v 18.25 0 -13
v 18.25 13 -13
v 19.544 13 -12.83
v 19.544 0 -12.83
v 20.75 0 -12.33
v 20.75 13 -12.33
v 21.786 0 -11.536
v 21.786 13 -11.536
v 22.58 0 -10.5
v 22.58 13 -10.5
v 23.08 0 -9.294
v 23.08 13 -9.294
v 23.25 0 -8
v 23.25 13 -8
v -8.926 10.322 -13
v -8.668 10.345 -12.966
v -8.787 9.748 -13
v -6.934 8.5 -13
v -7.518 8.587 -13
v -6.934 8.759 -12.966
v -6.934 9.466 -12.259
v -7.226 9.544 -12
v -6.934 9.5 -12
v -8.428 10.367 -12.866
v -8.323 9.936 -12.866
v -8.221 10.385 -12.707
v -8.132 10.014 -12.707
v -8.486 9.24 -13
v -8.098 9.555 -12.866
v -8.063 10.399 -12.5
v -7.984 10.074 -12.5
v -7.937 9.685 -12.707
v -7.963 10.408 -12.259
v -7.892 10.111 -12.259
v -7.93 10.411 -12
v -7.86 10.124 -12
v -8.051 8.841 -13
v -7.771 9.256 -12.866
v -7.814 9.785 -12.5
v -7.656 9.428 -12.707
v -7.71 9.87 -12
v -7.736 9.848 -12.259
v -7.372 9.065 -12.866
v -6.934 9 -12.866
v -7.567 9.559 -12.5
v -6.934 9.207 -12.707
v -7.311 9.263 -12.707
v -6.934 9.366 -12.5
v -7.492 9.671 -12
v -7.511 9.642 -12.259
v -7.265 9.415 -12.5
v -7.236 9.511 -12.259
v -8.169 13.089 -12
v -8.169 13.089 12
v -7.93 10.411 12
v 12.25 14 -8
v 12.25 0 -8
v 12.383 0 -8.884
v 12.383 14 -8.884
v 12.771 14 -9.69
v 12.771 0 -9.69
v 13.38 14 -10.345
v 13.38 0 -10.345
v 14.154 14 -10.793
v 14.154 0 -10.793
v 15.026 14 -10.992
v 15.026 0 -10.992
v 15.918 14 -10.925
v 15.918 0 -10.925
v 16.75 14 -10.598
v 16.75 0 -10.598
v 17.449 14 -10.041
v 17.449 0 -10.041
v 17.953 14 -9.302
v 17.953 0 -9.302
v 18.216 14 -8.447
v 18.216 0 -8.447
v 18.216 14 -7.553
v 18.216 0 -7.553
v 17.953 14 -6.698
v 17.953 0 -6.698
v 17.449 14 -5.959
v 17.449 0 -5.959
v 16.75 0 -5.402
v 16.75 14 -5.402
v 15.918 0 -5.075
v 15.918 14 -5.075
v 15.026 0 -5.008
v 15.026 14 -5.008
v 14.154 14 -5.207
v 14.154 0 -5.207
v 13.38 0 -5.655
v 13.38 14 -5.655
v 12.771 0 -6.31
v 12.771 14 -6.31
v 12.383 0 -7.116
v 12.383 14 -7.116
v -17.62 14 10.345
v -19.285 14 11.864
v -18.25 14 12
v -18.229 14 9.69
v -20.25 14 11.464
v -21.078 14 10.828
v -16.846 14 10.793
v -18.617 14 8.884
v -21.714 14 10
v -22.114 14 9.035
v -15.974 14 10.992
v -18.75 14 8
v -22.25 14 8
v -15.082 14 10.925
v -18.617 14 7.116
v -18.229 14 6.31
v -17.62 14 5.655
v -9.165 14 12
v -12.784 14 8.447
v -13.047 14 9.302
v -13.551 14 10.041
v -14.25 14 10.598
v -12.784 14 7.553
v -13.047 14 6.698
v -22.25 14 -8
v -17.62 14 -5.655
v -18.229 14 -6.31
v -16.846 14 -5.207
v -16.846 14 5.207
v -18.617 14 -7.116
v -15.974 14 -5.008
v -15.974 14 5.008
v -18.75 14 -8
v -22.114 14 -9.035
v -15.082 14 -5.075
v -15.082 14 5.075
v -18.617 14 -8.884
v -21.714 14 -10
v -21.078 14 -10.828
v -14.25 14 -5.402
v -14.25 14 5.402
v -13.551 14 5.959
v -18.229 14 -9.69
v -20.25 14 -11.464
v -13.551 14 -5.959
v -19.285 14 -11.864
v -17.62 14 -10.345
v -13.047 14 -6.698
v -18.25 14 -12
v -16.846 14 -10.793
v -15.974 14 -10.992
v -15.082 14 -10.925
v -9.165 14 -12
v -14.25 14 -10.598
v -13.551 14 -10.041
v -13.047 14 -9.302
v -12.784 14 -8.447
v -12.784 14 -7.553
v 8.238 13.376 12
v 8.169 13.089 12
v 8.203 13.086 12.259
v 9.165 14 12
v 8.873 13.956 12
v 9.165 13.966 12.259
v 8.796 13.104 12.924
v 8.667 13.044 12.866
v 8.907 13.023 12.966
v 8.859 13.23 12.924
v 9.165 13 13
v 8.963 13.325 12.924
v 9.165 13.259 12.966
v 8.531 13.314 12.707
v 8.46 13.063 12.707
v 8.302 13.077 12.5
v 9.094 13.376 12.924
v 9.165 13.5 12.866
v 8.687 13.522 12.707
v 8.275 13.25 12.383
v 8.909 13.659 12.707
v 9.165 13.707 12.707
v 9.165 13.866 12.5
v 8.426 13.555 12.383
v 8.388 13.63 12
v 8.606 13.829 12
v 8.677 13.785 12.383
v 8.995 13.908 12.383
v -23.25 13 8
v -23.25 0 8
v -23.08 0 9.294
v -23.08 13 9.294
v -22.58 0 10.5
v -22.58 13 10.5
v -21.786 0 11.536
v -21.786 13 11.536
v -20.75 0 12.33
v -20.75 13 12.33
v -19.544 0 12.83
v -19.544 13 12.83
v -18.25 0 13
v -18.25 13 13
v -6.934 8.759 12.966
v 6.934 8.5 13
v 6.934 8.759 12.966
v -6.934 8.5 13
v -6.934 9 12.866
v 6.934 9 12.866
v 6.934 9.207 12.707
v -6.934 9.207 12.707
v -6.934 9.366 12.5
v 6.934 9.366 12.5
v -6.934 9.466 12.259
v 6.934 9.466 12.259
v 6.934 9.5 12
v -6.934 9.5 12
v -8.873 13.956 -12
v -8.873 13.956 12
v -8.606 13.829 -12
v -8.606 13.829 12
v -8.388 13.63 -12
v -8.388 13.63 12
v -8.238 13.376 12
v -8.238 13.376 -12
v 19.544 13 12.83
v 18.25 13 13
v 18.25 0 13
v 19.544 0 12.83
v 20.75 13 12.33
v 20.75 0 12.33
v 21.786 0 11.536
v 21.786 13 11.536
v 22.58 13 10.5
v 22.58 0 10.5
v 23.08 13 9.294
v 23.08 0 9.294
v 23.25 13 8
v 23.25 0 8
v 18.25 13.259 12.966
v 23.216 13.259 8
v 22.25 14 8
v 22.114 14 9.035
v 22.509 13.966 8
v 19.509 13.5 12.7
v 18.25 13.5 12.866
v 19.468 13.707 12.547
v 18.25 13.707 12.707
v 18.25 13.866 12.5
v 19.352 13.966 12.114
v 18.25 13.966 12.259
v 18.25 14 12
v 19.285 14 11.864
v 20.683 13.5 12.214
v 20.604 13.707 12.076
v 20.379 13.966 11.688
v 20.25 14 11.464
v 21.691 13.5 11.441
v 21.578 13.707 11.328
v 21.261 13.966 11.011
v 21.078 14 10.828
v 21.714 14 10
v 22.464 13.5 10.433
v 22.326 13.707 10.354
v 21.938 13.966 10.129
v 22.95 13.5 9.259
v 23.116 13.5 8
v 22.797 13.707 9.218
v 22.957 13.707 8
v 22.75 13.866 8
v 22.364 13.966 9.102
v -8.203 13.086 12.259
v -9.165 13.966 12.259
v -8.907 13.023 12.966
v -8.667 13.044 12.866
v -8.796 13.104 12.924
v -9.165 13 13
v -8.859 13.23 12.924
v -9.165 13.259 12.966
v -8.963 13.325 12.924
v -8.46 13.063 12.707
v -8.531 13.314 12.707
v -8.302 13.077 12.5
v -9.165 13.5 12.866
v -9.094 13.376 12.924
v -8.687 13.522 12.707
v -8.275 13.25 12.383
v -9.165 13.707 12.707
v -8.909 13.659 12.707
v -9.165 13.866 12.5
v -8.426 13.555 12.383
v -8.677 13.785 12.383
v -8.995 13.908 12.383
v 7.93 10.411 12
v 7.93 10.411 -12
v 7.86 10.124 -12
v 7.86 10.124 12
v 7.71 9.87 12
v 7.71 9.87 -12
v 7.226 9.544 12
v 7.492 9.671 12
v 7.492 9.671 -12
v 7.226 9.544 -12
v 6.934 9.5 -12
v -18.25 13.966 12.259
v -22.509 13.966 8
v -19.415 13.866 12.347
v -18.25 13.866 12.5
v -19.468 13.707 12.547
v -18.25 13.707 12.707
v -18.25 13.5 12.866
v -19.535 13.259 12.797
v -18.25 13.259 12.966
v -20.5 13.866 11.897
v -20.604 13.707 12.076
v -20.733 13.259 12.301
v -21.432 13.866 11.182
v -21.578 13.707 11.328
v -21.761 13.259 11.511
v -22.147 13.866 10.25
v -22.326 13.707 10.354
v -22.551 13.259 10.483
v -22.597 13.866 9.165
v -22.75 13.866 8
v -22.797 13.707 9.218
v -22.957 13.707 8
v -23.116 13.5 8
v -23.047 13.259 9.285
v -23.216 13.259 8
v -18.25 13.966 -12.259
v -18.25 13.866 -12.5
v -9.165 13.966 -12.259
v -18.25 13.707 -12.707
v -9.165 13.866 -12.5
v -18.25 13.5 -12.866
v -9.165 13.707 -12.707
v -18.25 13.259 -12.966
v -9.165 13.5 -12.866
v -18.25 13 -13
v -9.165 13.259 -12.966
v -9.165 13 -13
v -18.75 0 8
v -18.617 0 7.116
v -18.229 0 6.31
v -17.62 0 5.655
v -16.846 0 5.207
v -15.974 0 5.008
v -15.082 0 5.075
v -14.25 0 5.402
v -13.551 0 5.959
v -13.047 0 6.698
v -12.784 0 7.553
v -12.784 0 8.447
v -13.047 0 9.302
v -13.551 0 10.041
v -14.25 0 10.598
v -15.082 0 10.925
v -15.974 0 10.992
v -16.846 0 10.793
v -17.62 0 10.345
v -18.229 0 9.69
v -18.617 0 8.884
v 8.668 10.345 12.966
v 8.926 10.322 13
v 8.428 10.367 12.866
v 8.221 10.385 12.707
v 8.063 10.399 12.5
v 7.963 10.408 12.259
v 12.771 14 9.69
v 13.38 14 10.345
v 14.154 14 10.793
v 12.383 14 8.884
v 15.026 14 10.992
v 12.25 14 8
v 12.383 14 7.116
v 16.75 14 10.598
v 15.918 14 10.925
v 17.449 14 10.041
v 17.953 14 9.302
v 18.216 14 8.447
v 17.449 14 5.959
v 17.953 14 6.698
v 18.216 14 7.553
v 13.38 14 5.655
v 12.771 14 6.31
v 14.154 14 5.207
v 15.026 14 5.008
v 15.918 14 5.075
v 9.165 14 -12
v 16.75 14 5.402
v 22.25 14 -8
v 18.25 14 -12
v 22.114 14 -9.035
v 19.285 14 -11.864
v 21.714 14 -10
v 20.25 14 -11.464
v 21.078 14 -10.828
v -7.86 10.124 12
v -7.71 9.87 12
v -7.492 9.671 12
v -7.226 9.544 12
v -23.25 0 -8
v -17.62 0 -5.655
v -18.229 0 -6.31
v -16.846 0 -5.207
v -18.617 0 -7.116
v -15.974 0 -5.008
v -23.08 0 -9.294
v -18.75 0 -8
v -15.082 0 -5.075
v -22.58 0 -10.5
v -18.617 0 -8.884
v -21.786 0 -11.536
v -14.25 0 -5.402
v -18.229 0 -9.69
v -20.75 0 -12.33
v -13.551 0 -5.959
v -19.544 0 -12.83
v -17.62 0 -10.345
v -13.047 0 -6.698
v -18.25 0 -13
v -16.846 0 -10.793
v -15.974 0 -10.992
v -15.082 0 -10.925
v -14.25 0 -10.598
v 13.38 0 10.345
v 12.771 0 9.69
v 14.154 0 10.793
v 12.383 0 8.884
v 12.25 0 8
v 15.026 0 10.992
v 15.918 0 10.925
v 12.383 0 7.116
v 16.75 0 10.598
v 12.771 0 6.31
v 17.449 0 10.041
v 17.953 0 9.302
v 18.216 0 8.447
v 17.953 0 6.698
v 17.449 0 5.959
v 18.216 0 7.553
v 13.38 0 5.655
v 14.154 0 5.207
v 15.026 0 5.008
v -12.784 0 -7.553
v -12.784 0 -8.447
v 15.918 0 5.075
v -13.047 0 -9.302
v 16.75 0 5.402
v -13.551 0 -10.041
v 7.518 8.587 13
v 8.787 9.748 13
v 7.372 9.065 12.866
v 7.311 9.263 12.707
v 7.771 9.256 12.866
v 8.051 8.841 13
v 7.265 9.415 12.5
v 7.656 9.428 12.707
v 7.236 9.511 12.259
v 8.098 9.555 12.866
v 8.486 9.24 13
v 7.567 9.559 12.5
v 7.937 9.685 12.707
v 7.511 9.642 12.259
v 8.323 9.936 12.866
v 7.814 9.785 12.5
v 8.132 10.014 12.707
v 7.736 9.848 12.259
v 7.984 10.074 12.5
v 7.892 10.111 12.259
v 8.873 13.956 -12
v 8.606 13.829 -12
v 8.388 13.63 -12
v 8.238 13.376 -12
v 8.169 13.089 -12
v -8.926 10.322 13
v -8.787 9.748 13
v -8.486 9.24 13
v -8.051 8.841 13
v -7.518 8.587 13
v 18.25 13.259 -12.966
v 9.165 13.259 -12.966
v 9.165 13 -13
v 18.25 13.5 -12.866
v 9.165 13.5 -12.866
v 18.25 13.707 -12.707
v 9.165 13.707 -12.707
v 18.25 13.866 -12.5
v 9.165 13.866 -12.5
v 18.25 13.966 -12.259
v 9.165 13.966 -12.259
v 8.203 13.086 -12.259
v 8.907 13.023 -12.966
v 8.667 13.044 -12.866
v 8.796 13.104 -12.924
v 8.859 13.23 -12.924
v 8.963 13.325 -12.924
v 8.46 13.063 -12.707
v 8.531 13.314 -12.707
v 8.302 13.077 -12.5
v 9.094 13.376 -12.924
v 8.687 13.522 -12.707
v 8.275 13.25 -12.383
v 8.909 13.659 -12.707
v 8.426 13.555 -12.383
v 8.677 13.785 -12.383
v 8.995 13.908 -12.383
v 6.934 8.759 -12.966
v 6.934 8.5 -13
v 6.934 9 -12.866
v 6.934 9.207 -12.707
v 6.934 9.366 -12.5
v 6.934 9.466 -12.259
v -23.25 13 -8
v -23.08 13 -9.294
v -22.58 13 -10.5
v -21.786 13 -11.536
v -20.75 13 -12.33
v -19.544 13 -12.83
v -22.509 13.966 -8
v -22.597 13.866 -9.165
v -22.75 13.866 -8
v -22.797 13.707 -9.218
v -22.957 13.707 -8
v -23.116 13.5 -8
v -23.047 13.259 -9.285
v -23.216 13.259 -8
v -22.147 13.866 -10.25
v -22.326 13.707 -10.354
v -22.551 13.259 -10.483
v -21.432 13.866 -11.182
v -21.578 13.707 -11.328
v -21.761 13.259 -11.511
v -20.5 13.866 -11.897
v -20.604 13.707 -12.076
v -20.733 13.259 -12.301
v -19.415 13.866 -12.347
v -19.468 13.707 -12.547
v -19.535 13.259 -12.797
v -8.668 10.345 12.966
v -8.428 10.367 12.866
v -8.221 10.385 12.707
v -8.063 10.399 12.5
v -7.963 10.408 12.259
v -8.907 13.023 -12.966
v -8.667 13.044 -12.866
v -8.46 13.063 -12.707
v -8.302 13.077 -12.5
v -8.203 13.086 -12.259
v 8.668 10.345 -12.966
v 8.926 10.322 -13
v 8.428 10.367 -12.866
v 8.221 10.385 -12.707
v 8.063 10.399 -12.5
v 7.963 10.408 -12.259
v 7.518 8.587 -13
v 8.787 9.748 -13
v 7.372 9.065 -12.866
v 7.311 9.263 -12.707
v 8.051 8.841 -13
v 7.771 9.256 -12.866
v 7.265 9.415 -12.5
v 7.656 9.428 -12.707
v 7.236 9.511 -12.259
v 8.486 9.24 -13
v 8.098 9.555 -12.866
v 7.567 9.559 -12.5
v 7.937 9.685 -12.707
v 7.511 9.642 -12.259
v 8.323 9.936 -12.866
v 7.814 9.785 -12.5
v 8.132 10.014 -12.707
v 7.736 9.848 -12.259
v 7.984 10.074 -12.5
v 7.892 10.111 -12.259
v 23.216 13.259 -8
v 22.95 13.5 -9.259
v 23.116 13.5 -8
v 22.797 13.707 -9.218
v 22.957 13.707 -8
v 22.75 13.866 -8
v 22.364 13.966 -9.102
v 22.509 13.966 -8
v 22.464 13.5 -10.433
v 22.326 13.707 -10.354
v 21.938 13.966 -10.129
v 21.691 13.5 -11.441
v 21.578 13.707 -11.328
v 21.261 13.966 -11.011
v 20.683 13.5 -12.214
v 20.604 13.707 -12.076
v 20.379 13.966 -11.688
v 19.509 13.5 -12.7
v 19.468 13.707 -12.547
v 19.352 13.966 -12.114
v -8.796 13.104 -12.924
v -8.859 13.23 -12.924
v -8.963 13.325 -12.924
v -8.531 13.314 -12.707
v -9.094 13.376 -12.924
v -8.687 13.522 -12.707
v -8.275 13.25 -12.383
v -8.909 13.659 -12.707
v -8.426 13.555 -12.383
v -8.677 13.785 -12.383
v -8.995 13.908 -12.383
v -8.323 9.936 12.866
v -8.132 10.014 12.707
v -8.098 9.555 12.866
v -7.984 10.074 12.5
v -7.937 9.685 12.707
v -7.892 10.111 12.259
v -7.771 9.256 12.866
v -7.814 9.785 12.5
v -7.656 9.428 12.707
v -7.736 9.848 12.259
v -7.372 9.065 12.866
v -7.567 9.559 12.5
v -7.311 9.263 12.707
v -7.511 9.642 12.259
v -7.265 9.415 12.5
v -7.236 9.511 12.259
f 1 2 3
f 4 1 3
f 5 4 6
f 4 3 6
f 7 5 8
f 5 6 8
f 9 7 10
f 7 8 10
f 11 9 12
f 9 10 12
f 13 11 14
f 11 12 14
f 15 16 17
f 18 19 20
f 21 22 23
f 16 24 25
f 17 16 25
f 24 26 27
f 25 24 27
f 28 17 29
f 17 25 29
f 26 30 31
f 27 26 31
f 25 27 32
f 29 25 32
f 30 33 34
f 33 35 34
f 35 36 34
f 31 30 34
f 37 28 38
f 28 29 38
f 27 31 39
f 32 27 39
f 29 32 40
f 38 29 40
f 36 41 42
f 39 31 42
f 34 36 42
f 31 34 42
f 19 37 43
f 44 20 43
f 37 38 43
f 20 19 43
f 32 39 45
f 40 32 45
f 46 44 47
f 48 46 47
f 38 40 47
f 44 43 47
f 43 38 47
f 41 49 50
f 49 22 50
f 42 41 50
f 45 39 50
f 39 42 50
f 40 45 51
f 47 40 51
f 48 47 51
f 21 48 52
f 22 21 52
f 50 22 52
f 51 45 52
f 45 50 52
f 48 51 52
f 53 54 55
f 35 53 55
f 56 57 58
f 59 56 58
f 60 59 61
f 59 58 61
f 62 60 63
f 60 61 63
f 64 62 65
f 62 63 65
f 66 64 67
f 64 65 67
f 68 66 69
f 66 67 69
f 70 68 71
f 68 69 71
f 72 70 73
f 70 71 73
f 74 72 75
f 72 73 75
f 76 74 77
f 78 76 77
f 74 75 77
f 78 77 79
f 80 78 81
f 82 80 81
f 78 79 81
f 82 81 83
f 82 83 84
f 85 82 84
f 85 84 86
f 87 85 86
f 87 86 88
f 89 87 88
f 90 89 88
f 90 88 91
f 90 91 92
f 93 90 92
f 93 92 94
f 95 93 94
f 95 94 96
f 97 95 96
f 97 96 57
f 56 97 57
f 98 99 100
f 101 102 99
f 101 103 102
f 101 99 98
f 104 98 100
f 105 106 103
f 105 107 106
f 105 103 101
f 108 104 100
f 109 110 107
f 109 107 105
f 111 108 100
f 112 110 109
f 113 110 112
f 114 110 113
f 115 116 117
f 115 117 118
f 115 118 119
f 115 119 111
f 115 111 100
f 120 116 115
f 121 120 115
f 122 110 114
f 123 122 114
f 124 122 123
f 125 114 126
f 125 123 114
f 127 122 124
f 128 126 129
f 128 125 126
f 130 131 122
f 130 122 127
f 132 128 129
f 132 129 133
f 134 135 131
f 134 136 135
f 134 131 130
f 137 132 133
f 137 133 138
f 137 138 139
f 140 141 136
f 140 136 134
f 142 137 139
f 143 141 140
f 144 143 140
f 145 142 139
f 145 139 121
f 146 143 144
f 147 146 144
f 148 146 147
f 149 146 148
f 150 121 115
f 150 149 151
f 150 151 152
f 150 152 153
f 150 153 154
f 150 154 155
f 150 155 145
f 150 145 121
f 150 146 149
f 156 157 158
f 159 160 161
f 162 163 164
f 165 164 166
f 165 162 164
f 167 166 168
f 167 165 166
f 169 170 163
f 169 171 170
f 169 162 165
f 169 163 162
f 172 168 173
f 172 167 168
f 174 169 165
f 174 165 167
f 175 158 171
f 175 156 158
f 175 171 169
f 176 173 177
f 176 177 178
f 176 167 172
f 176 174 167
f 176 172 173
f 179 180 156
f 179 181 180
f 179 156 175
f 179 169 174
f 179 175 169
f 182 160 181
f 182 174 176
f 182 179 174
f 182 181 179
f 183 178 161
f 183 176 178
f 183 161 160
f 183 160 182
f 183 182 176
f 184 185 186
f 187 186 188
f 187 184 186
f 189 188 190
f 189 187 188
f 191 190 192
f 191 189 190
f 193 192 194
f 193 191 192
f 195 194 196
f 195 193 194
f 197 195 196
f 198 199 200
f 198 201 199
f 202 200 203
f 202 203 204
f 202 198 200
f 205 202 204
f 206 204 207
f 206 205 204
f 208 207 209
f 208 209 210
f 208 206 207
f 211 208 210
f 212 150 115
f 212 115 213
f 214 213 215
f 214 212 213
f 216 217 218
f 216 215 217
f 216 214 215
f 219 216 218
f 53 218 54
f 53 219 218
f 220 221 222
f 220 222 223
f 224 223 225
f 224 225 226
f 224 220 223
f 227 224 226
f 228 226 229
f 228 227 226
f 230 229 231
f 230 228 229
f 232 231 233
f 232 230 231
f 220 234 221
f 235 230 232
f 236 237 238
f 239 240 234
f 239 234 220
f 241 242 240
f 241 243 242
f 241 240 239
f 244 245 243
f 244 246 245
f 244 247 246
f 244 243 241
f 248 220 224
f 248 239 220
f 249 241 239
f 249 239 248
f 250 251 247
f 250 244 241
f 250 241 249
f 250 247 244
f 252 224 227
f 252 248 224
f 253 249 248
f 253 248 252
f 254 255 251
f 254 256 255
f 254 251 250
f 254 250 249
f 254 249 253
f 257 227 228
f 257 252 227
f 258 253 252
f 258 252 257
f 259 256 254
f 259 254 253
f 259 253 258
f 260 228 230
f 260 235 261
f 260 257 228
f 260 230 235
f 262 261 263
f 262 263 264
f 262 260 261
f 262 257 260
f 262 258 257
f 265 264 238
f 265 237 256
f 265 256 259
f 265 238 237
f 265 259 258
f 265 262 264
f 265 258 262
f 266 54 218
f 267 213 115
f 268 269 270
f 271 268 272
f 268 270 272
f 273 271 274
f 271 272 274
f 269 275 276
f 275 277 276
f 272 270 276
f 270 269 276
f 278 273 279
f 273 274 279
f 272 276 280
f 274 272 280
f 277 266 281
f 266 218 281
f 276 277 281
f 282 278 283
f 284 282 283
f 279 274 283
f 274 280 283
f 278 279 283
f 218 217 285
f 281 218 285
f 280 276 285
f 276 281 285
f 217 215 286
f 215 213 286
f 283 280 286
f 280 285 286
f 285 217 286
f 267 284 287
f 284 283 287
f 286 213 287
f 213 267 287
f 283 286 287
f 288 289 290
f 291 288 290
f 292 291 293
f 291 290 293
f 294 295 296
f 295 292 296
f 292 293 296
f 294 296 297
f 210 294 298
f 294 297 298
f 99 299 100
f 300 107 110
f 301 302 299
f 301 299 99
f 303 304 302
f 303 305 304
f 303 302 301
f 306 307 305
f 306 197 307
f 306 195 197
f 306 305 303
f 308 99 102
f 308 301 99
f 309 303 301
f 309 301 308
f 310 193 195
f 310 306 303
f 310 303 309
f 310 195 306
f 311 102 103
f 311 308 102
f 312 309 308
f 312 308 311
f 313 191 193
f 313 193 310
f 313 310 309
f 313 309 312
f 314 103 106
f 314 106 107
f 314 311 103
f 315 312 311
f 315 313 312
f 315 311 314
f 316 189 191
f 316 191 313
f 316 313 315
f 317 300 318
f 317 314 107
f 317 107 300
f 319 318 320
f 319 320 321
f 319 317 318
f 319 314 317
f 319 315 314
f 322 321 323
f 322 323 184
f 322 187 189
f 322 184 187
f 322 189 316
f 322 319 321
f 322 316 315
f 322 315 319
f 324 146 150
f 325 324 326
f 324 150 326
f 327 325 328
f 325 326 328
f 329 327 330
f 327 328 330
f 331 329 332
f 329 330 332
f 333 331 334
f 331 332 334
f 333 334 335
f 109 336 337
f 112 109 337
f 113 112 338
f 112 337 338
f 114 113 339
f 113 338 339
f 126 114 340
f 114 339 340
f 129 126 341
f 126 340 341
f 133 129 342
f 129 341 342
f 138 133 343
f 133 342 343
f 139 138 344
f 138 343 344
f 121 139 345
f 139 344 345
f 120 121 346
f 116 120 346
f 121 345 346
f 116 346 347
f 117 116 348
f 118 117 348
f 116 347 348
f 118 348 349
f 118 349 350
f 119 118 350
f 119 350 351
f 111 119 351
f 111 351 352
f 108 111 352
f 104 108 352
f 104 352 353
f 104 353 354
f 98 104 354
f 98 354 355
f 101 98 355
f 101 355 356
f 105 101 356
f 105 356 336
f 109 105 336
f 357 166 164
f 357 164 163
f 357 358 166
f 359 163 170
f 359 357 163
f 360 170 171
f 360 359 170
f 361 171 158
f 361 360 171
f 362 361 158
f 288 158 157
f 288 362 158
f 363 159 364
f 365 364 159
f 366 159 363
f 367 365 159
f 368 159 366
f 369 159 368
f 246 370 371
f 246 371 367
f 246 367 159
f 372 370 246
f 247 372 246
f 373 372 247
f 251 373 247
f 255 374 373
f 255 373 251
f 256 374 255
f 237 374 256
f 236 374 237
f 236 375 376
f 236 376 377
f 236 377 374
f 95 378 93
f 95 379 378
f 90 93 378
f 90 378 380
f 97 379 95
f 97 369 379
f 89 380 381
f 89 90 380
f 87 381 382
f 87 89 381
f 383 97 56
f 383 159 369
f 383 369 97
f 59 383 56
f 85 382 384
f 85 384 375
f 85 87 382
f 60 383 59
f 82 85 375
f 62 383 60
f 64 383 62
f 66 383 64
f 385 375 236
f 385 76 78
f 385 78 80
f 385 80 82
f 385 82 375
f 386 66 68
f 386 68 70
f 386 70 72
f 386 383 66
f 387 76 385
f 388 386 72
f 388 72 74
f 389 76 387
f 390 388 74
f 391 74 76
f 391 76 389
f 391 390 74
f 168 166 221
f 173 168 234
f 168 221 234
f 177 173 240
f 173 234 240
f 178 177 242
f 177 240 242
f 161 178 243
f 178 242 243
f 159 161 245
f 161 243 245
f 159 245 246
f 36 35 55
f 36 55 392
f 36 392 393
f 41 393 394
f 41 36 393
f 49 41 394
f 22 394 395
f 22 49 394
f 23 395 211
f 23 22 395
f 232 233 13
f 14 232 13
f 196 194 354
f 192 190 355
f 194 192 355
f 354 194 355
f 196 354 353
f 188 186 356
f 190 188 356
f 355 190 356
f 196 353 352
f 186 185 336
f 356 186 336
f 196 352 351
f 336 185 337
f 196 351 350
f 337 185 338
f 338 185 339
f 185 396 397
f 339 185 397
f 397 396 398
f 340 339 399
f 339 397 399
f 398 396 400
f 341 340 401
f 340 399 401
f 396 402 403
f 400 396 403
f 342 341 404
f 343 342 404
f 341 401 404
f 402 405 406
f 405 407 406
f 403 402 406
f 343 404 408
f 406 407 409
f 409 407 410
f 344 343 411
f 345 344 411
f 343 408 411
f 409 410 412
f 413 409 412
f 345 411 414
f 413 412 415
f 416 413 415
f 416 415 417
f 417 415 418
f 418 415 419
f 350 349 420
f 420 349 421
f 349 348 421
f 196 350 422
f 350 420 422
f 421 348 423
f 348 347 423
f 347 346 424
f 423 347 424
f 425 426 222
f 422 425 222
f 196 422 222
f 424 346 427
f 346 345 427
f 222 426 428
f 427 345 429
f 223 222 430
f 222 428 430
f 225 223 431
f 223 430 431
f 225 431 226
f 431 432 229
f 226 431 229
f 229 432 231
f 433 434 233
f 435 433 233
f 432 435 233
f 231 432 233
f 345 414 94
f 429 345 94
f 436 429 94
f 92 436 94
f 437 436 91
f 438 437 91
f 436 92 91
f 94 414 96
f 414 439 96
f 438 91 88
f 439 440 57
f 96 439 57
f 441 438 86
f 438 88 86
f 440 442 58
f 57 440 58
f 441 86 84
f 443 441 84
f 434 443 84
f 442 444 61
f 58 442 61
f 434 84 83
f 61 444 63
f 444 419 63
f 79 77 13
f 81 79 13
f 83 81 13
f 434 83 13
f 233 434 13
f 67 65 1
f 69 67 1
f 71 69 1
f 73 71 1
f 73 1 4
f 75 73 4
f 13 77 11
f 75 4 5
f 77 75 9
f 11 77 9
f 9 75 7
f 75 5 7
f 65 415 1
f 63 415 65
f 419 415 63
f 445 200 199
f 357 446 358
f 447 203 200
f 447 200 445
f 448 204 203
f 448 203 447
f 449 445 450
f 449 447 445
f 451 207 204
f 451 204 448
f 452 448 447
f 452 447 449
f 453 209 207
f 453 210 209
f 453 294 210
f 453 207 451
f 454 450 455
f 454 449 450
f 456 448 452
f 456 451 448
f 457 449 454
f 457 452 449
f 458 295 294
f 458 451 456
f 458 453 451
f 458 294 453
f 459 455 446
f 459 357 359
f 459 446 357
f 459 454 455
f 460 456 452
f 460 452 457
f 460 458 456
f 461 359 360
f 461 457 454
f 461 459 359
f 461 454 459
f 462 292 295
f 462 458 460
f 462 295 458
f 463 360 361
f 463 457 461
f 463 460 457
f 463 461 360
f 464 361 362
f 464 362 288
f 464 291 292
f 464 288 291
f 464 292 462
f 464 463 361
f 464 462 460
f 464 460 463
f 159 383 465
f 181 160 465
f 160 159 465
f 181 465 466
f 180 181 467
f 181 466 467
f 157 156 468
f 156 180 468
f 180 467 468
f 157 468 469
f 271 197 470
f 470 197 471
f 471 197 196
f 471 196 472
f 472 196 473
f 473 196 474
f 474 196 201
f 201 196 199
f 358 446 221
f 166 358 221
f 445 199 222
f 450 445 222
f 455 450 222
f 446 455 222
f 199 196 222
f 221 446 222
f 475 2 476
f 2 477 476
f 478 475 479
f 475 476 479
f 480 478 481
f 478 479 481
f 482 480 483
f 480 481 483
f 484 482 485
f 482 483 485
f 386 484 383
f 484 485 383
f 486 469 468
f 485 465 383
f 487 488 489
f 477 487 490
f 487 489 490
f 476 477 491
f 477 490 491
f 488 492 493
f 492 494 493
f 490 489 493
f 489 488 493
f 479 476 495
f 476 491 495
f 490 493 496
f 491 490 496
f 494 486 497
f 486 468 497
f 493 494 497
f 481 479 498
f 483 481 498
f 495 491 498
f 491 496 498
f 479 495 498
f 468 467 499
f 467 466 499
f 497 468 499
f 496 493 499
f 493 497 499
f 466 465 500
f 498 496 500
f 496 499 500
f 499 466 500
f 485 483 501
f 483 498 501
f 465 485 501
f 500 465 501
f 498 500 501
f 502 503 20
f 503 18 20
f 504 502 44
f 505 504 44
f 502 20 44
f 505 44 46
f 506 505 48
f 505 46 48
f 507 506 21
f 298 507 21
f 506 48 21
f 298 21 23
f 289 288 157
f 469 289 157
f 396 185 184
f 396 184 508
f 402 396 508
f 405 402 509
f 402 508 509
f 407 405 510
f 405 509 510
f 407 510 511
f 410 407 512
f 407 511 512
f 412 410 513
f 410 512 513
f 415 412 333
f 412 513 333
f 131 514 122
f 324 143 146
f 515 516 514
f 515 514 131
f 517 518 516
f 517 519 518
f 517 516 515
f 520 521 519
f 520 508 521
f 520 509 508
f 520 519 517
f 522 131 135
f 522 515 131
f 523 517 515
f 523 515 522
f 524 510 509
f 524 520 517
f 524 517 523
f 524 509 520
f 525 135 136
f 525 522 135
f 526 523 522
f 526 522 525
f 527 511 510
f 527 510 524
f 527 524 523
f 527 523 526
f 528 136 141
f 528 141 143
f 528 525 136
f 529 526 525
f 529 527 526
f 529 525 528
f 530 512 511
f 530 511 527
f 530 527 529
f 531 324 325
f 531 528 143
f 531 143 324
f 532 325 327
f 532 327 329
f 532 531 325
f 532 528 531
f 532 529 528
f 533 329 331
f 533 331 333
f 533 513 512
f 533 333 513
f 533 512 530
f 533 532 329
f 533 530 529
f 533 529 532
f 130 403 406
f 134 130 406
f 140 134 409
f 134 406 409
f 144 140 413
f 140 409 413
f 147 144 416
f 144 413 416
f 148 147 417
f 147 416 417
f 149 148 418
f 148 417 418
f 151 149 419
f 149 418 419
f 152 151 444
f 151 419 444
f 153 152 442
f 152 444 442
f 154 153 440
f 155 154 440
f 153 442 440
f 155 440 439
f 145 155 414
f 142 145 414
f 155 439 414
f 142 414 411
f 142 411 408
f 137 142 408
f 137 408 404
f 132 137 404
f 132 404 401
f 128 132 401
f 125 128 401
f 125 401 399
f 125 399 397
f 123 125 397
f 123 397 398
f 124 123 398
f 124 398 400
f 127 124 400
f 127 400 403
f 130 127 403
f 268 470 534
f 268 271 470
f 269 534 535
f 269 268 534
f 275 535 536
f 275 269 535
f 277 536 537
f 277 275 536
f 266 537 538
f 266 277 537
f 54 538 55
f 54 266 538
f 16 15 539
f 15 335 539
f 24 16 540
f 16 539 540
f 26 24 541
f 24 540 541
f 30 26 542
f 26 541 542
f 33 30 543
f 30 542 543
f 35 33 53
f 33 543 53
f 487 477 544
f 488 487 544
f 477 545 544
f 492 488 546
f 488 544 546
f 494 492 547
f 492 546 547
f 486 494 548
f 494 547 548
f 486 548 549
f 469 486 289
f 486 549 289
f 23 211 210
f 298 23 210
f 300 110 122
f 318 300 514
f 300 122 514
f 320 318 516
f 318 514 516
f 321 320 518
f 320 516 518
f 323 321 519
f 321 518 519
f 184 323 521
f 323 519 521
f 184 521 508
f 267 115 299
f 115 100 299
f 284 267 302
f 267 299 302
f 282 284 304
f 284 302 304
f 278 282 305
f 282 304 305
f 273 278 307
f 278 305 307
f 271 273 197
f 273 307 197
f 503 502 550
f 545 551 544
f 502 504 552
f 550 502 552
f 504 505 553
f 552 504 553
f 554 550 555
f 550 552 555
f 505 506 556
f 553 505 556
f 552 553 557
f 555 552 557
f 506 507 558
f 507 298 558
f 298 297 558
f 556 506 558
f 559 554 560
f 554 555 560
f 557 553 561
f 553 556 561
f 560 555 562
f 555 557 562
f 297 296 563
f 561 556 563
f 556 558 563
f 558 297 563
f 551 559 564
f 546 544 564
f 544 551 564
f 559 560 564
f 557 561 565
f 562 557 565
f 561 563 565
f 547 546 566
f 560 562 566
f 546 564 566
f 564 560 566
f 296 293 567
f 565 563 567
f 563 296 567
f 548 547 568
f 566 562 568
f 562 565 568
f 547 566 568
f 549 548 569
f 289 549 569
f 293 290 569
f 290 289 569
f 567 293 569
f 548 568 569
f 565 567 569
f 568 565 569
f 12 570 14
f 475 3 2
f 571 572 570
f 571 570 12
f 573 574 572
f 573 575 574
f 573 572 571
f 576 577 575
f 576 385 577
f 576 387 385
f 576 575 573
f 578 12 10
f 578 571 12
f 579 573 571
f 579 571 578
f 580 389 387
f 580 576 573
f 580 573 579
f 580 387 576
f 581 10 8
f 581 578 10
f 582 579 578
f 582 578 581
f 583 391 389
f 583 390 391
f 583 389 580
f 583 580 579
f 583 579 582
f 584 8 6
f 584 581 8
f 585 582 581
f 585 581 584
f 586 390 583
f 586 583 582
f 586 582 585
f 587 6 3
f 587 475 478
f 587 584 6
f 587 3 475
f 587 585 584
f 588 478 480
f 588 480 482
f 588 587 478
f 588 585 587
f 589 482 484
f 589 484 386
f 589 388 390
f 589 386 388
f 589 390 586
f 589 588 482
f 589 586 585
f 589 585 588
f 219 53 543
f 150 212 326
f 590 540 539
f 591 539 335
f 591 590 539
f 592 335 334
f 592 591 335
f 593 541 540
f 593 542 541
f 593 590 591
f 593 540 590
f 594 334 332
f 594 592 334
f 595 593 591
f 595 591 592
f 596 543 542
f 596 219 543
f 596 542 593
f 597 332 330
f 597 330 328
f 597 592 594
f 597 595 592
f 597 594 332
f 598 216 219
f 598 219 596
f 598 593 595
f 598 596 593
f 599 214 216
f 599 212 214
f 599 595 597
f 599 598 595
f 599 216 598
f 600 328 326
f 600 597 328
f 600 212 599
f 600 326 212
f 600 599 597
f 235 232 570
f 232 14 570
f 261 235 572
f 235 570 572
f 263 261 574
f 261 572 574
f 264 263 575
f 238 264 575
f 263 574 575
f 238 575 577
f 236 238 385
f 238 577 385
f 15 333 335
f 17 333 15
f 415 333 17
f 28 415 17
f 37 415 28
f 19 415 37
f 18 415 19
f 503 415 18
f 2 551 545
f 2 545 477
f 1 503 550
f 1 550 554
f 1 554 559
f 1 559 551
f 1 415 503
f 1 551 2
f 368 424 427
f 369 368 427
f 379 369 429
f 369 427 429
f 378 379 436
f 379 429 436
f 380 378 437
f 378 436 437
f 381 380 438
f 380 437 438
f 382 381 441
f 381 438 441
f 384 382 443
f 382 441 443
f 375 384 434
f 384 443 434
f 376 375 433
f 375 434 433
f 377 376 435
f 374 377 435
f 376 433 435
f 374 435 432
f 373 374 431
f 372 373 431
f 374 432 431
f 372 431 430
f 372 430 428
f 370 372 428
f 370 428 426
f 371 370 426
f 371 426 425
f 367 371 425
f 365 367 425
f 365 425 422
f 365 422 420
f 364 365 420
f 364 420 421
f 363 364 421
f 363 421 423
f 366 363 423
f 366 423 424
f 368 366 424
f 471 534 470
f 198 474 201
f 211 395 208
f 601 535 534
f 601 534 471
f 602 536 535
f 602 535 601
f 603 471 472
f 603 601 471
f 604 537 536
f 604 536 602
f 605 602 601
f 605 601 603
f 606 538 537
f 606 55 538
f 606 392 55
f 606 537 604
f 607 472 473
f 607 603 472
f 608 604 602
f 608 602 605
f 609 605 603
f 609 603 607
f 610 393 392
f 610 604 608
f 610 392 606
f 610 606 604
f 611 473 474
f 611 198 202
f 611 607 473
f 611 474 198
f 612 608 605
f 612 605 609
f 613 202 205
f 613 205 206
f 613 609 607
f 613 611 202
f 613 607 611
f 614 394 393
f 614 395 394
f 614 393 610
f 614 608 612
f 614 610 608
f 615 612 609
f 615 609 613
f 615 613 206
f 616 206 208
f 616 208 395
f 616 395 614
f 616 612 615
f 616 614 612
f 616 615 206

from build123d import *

# Parameters (mm, degrees)
SKETCH2_W             = 46.5
SKETCH2_H             = 26
BOSS_EXTRUDE1_DEPTH   = 14
CUT_EXTRUDE1_DEPTH    = 40.354955215
FILLET1_R             = 5
FILLET2_R             = 1
F_6_0MM_DOWEL_HOLE1_D = 6


with BuildPart() as part:
    # Sketch2 → Boss-Extrude1 (new body)
    with BuildSketch(Plane(origin=(0, 0, 0), x_dir=(1, 0, 0), z_dir=(0, 1, 0))):
        Rectangle(SKETCH2_W, SKETCH2_H)
    extrude(amount=BOSS_EXTRUDE1_DEPTH)

    # Sketch5 → Cut-Extrude1 (cut, through all)
    with BuildSketch(Plane.XY.offset(15.5)):
        Polygon((-8.25, 14), (-7.848214286, 9.5), (7.848214286, 9.5), (8.25, 14), align=None)
    extrude(amount=-CUT_EXTRUDE1_DEPTH, mode=Mode.SUBTRACT)

    # Fillet1
    fillet1_edges = [part.edges().sort_by_distance(p)[0] for p in [
        (-23.25, 7, -13),
        (23.25, 7, -13),
        (23.25, 7, 13),
        (-23.25, 7, 13),
    ]]
    fillet(fillet1_edges, radius=FILLET1_R)

    # Fillet2
    fillet2_edges = [part.edges().sort_by_distance(p)[0] for p in [
        (13.25, 14, 13),
        (-13.25, 14, -13),
        (-8.25, 14, 0),
        (7.848214286, 9.5, 0),
        (0, 9.5, 13),
        (0, 9.5, -13),
        (-7.848214286, 9.5, 0),
        (-8.049107143, 11.75, 13),
        (-8.049107143, 11.75, -13),
        (8.25, 14, 0),
        (8.049107143, 11.75, 13),
        (8.049107143, 11.75, -13),
        (13.25, 14, -13),
        (23.25, 14, 0),
        (21.785533906, 14, 11.535533906),
        (21.785533906, 14, -11.535533906),
        (-13.25, 14, 13),
        (-23.25, 14, 0),
        (-21.785533906, 14, 11.535533906),
        (-21.785533906, 14, -11.535533906),
    ]]
    fillet(fillet2_edges, radius=FILLET2_R)

    # Ø6.0mm Dowel Hole1 (through all)
    with Locations(Plane(origin=(0, 14, 0), x_dir=(1, 0, 0), z_dir=(0, 1, 0))):
        with Locations((15.25, 8), (15.25, -8), (-15.75, -8), (-15.75, 8)):
            Hole(F_6_0MM_DOWEL_HOLE1_D / 2)


solid = part.part
